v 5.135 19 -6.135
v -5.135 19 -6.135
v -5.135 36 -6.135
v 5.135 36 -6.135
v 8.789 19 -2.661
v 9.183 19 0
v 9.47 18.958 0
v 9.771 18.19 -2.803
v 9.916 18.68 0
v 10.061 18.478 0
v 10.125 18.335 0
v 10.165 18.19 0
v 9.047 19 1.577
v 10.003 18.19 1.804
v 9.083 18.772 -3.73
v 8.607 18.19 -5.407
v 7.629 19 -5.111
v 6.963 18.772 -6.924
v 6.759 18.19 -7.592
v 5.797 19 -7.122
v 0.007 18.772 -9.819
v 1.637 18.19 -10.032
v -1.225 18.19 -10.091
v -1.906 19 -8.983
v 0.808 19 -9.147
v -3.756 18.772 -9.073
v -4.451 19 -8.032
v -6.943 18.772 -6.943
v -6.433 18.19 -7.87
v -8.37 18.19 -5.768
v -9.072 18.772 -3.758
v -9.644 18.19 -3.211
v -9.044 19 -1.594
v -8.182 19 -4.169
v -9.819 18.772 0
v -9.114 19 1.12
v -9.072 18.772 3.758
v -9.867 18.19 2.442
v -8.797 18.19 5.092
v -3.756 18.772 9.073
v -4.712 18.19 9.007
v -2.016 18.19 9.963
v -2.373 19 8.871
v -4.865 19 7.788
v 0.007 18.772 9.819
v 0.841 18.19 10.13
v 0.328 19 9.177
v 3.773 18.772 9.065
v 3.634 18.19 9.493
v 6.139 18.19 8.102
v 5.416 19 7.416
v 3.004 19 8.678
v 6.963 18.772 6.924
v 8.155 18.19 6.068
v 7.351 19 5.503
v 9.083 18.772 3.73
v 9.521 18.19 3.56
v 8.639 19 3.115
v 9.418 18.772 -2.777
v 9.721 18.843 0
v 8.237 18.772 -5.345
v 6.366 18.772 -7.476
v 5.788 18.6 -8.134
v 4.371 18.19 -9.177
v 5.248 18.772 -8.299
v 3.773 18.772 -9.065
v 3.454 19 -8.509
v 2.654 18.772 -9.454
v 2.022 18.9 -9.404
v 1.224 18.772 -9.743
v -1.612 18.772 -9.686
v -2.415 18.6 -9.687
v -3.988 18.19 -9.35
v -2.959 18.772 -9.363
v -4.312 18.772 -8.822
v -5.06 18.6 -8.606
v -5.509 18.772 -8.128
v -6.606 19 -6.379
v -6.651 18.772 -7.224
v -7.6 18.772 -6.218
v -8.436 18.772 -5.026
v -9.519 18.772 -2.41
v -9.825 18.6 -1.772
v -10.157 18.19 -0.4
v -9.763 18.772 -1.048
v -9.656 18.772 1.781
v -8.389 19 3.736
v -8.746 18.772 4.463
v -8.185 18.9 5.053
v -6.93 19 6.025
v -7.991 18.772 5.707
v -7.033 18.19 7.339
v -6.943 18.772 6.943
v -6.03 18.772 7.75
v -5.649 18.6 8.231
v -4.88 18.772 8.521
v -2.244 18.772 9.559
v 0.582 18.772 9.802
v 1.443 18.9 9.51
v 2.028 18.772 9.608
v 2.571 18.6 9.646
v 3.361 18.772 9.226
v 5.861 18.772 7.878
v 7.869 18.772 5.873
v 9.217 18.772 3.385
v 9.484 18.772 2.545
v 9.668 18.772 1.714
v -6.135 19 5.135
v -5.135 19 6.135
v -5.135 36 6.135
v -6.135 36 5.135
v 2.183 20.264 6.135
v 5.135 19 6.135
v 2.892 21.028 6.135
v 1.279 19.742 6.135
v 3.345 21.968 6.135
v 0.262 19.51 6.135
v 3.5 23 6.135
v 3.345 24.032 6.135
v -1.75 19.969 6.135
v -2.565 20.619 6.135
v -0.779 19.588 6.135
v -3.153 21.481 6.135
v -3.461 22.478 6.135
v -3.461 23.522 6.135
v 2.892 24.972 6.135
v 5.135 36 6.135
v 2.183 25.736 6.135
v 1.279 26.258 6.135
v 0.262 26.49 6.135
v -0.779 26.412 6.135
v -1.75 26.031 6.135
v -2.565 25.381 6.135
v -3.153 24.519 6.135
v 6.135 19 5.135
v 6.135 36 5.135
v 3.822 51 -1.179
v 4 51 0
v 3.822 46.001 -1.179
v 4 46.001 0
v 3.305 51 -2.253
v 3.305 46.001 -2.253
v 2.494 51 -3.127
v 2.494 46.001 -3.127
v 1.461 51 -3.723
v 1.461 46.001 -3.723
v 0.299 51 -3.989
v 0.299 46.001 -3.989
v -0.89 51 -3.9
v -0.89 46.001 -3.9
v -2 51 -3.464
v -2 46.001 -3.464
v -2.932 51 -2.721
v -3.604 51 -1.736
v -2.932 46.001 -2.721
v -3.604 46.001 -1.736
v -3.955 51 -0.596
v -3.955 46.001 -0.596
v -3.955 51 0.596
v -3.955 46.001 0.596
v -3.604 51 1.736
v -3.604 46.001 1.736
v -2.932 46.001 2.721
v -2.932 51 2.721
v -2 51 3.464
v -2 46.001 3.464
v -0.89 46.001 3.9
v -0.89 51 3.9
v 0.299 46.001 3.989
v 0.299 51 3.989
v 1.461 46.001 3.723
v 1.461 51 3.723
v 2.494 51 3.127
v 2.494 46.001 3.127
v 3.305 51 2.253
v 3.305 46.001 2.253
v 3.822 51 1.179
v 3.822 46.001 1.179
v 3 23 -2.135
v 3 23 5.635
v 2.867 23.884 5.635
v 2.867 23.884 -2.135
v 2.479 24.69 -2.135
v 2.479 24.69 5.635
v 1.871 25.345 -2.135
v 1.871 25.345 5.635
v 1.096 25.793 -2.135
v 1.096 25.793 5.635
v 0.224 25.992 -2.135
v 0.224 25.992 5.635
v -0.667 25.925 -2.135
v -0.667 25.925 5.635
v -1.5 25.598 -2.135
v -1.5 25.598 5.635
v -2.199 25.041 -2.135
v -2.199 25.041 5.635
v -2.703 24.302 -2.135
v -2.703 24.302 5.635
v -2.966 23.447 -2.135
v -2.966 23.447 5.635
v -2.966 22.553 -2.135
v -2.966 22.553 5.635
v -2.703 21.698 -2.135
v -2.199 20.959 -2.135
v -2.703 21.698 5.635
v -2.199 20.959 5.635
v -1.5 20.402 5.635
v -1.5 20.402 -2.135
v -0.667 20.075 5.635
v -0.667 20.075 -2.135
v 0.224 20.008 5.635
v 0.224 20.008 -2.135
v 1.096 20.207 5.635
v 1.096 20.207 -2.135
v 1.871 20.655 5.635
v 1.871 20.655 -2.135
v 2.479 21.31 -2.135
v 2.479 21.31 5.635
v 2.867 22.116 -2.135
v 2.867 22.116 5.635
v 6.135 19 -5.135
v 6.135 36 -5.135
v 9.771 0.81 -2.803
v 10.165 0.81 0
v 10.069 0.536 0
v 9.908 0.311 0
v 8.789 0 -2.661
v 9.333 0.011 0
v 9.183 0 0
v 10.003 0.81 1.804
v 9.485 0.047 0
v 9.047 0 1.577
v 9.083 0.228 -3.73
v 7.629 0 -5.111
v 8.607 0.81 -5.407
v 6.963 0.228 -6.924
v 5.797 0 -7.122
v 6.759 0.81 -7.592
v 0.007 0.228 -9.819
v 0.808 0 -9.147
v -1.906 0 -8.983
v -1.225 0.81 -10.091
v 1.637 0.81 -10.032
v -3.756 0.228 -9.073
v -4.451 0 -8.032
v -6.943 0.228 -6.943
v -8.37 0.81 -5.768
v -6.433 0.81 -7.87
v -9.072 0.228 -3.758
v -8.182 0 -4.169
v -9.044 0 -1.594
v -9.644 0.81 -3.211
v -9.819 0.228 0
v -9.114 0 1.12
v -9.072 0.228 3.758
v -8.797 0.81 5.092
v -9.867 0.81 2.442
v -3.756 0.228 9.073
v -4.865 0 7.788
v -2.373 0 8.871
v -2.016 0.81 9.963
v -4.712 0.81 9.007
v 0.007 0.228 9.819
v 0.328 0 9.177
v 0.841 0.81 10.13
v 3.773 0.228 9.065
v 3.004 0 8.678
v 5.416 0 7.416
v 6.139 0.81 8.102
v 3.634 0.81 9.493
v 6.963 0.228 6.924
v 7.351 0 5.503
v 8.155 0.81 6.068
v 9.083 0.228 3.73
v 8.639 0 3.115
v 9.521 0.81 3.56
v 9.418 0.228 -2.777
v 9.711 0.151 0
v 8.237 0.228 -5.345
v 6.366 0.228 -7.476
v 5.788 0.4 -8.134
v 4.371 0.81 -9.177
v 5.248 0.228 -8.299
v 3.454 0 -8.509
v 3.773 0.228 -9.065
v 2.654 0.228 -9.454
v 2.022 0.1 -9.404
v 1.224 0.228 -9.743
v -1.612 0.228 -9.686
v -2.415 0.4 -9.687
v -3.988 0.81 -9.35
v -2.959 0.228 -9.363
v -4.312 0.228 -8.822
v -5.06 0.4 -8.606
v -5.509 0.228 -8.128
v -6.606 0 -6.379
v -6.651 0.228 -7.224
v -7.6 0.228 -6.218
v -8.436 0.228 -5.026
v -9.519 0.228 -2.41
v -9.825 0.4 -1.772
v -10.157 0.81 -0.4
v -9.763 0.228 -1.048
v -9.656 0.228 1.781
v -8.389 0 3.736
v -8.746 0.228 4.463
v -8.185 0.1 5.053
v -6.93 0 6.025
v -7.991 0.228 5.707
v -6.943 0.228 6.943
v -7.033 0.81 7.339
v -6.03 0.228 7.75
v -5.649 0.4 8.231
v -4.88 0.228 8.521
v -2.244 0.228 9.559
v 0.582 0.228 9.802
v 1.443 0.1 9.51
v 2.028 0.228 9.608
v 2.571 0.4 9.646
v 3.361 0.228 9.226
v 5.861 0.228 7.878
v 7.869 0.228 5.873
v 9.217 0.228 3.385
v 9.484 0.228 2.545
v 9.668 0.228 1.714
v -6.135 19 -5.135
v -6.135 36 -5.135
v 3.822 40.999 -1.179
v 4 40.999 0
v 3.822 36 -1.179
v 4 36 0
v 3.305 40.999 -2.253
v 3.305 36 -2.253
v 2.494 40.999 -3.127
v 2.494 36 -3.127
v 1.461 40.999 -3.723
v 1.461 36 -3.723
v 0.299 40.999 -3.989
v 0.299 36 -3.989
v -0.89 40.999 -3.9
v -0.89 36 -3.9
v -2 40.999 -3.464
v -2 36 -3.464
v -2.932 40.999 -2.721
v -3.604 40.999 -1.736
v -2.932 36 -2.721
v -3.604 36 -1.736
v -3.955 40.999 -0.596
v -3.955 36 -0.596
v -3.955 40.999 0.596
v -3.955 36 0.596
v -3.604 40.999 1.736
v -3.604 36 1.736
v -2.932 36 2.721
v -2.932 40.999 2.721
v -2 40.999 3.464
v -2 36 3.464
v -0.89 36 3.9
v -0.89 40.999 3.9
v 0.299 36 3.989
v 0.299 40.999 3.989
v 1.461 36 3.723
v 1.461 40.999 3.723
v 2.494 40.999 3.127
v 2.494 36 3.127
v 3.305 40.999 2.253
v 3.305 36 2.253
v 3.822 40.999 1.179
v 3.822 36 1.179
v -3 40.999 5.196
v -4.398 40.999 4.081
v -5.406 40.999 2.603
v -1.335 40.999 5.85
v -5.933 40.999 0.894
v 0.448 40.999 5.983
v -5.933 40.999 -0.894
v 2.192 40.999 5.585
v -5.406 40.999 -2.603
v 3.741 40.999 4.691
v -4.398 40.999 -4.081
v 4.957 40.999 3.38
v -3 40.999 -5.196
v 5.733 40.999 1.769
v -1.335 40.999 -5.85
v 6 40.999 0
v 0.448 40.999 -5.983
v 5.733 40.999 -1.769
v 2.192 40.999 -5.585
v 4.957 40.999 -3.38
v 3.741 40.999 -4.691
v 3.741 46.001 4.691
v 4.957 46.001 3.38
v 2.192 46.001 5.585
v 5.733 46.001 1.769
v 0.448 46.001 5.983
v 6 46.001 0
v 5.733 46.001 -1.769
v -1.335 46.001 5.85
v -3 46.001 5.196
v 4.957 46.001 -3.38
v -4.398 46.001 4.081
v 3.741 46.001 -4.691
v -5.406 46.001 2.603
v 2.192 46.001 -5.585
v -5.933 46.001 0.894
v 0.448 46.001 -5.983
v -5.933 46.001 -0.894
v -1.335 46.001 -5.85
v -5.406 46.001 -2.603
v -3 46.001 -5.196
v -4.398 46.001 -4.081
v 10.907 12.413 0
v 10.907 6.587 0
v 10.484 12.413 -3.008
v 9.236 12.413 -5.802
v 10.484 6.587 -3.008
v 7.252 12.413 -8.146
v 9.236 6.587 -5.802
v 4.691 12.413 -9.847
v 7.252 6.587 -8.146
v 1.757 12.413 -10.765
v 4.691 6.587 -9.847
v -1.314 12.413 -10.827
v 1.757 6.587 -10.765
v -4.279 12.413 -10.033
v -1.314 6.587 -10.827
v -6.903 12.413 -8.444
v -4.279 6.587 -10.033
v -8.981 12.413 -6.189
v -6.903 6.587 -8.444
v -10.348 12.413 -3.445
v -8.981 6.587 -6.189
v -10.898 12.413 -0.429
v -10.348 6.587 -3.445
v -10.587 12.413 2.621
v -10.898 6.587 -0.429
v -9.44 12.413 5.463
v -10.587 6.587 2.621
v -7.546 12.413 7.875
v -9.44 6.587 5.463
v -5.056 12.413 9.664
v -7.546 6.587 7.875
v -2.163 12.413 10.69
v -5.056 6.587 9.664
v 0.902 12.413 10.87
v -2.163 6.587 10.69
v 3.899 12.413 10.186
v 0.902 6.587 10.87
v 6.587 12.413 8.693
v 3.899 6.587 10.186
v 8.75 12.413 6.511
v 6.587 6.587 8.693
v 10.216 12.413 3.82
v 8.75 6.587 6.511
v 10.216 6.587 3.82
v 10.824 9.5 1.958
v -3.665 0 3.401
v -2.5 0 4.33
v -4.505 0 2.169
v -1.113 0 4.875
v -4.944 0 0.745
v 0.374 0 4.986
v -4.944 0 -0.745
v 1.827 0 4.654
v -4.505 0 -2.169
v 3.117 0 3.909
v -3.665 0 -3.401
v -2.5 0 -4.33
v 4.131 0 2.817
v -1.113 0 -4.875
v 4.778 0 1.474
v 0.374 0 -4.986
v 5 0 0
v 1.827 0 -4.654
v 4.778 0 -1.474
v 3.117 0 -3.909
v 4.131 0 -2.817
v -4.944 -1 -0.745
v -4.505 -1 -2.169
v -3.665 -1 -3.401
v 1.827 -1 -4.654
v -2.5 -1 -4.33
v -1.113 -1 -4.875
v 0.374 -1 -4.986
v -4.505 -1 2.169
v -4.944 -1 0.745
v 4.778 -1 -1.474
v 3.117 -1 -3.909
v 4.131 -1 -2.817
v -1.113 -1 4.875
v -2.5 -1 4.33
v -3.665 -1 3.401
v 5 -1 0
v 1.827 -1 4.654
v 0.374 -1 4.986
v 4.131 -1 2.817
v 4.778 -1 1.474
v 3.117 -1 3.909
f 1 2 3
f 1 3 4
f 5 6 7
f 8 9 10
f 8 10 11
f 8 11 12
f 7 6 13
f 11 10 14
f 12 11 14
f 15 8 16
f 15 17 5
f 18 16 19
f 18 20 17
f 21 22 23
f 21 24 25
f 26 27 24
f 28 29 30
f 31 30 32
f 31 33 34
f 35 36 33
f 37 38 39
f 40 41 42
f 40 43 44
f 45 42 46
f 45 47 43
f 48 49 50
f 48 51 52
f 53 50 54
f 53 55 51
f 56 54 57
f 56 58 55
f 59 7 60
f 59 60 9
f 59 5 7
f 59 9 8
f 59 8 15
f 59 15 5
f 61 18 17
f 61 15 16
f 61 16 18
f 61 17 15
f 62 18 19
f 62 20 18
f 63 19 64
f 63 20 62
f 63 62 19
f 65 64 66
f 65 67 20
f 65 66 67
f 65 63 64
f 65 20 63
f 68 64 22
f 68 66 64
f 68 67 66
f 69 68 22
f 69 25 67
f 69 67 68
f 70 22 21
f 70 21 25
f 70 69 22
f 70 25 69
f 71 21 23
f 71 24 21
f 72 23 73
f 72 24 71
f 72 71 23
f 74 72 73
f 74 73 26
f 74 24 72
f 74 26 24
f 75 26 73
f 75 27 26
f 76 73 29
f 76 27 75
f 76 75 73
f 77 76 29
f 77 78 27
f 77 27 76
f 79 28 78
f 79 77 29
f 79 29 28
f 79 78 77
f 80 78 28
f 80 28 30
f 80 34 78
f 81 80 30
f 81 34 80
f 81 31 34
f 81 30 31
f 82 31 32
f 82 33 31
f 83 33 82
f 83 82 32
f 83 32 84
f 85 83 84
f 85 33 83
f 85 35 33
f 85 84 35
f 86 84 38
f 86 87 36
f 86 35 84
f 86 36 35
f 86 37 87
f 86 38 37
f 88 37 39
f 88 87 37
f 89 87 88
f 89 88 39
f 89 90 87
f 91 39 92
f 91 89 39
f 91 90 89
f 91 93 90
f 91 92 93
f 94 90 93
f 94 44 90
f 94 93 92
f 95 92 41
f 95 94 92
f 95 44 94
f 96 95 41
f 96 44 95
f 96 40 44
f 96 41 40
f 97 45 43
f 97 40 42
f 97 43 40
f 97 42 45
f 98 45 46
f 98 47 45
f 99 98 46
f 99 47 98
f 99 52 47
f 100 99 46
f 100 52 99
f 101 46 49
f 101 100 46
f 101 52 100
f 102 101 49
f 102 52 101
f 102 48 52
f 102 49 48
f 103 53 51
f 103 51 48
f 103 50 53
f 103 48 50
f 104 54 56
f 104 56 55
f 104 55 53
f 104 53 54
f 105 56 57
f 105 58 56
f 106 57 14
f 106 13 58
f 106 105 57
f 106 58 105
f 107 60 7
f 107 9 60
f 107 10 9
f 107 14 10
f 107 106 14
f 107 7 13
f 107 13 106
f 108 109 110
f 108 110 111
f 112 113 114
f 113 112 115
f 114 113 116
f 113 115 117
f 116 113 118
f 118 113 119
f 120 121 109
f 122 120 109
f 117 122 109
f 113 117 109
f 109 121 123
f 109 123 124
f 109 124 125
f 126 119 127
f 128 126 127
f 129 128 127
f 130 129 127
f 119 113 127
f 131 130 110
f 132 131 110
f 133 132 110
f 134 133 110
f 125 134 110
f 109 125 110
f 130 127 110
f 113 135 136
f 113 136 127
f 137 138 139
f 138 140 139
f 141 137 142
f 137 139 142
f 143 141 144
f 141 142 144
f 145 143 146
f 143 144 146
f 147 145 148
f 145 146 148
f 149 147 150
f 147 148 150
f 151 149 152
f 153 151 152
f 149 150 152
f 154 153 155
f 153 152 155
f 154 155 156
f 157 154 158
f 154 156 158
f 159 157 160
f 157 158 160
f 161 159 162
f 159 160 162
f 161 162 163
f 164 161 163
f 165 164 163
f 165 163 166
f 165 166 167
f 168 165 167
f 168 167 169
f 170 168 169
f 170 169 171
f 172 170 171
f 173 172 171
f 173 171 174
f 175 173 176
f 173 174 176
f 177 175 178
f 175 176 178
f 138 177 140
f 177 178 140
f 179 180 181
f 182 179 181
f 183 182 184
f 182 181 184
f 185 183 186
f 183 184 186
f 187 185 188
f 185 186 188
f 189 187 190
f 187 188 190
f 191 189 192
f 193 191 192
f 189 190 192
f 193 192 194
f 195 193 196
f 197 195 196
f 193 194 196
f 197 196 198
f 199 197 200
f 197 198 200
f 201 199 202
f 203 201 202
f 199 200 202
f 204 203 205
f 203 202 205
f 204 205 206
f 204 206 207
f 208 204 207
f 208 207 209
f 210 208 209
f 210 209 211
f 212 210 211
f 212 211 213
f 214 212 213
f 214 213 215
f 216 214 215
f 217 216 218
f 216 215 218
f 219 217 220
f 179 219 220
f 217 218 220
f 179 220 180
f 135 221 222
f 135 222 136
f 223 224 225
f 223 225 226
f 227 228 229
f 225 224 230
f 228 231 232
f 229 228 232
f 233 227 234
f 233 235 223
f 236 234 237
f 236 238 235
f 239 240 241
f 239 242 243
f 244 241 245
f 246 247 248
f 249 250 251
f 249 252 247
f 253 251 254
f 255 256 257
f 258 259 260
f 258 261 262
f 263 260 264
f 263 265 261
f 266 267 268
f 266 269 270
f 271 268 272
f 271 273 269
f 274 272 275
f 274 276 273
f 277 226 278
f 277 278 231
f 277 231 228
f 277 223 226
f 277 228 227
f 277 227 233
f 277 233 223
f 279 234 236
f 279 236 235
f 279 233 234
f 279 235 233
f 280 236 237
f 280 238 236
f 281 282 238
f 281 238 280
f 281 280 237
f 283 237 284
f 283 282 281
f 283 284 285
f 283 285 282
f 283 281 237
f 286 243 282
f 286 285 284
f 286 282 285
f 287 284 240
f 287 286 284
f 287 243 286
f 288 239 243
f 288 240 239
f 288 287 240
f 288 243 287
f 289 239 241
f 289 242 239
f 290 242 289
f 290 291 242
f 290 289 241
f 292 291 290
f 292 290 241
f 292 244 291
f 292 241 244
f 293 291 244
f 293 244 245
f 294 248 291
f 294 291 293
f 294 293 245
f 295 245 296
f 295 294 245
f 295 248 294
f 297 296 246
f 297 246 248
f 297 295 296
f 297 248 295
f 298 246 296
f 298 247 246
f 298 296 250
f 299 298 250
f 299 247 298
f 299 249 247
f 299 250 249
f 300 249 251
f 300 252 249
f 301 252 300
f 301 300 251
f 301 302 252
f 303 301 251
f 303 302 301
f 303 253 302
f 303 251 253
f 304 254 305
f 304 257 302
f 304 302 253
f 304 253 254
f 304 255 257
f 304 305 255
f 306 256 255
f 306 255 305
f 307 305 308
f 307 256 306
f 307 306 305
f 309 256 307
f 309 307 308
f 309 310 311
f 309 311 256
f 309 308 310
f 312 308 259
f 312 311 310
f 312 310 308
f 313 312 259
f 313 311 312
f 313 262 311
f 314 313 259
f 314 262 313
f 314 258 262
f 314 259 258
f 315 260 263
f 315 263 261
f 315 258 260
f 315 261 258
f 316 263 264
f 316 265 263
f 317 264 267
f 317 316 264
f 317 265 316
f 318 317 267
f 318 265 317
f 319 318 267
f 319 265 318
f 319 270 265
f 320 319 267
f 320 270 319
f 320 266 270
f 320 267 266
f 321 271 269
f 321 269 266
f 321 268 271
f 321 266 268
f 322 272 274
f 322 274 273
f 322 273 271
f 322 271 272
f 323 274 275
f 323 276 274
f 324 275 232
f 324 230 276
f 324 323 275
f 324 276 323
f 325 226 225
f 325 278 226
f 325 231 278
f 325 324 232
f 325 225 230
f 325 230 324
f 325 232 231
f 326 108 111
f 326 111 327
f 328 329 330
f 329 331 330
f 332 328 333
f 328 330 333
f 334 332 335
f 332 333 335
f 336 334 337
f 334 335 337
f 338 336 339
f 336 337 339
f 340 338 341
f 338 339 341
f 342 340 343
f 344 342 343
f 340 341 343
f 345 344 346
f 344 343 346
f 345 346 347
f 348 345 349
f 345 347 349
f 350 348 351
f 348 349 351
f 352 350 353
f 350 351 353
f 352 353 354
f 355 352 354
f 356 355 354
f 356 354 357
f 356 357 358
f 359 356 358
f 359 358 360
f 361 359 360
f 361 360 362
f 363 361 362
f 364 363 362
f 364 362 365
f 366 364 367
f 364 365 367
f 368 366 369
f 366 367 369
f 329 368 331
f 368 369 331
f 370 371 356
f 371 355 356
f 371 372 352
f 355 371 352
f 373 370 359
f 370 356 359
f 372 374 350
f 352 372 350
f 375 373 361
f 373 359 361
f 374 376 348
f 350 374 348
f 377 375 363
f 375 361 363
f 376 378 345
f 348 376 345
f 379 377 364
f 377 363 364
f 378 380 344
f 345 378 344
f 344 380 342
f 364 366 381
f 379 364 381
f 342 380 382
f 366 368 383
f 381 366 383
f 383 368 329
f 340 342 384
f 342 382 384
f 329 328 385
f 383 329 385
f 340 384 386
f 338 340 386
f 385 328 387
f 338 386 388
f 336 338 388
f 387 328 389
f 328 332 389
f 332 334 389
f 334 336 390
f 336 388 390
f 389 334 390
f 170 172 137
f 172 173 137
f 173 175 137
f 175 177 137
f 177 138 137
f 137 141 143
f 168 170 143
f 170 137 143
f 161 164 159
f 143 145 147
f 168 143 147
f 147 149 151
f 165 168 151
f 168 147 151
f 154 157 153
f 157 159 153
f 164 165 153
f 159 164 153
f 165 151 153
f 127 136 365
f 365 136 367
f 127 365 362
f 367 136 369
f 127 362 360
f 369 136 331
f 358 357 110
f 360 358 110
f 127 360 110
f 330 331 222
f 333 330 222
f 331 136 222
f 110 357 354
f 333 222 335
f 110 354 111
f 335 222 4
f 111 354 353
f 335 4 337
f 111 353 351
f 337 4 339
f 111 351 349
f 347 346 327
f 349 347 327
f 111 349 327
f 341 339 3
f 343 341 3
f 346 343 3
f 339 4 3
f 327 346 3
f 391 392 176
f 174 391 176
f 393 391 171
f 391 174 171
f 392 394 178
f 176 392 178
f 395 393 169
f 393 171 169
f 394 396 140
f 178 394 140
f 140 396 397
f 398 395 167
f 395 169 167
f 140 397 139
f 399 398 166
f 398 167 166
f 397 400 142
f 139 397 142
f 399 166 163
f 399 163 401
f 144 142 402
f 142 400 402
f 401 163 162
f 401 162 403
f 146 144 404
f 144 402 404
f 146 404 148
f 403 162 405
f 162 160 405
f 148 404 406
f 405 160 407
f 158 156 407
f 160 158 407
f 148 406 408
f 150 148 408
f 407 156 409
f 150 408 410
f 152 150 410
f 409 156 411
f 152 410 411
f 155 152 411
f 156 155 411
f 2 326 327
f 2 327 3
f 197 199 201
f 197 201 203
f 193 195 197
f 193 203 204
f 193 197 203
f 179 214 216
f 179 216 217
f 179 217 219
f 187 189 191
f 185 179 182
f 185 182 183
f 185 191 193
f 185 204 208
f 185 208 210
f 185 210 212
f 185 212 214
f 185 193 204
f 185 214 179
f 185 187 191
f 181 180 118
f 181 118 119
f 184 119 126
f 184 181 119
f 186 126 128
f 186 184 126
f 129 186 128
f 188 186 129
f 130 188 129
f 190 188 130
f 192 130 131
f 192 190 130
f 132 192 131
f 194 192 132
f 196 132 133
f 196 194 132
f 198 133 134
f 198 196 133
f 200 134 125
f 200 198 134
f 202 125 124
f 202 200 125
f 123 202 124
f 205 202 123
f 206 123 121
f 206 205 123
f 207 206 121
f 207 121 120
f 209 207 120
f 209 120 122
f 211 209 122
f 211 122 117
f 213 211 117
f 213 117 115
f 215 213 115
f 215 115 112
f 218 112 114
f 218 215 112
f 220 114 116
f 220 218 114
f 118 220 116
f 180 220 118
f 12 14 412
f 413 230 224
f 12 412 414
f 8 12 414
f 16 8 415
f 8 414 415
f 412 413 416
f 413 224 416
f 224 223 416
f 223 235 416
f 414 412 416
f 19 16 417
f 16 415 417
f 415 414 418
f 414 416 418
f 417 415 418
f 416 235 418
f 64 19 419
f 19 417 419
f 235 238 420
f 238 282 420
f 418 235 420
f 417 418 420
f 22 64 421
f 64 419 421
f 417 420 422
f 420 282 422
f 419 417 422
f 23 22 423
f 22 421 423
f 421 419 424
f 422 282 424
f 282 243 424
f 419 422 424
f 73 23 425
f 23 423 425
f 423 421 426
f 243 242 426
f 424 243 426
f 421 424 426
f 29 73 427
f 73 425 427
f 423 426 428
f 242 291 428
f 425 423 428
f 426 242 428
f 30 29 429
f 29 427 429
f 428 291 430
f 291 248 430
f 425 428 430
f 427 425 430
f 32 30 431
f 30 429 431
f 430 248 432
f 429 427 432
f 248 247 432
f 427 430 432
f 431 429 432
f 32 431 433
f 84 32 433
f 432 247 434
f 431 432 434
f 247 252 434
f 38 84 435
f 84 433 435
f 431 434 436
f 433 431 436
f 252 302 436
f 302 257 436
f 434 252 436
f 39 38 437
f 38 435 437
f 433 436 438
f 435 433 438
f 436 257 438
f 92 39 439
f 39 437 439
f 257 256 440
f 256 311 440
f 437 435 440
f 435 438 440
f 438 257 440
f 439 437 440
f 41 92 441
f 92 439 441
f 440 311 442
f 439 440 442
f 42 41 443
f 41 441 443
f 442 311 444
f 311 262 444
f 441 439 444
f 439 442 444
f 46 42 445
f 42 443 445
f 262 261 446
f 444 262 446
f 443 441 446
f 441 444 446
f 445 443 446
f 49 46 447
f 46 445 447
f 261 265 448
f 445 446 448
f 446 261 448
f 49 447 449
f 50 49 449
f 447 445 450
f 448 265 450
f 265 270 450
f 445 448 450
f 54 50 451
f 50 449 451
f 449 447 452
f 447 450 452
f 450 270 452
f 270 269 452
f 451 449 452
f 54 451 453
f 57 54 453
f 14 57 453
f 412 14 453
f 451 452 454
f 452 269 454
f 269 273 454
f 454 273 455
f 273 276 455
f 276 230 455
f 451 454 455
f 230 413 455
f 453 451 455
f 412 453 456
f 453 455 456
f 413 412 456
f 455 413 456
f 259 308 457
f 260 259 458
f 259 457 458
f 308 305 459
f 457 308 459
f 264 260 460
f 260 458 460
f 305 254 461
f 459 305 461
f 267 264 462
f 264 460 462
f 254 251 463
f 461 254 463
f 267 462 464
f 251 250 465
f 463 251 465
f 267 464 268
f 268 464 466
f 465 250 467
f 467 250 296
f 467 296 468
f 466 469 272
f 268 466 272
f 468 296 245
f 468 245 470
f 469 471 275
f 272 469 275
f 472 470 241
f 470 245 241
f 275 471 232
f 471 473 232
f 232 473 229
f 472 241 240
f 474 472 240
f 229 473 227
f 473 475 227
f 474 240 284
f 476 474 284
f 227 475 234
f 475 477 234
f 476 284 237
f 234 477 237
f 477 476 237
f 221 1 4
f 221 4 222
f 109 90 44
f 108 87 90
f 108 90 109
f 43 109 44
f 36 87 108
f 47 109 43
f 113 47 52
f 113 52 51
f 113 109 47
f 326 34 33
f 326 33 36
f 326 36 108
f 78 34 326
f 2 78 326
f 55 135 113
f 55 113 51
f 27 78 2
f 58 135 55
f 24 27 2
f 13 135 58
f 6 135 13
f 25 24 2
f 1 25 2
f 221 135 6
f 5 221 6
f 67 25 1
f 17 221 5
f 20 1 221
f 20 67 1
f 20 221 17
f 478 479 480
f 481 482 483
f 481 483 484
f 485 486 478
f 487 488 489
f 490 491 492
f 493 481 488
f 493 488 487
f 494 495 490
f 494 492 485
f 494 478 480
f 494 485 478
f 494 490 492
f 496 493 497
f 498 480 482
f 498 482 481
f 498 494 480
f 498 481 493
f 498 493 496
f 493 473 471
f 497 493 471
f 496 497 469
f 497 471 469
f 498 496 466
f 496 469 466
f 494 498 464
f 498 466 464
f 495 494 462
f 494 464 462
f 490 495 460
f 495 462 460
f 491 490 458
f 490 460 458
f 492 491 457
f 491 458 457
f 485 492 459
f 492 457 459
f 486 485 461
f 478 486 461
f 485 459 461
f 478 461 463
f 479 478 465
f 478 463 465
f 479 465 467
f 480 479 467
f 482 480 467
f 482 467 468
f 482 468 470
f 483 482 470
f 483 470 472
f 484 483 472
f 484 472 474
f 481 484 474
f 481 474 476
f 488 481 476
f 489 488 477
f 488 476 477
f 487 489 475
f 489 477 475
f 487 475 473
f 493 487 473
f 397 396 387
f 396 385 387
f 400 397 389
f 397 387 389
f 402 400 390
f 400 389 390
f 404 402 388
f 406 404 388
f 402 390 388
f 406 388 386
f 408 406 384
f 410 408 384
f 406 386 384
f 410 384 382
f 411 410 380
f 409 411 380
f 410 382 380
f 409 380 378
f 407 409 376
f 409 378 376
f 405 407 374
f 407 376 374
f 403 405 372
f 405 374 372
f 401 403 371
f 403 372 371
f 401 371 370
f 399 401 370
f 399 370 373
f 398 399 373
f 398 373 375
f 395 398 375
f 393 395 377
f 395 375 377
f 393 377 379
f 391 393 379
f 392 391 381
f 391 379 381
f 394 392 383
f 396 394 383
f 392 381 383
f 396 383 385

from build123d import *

# Parameters (mm, degrees)
SKETCH2_OUTSIDE_W   = 35.948
SKETCH2_OUTSIDE_H   = 35.948
CUT_EXTRUDE1_DEPTH  = 17
SKETCH3_R           = 3
CUT_EXTRUDE2_DEPTH  = 8.269428
CHAMFER1_SIZE       = 0.5
SKETCH4_R           = 5
BOSS_EXTRUDE1_DEPTH = 1
FILLET1_R           = 1


with BuildPart() as part:
    # Sketch1 → Revolve1 (revolve)
    with BuildSketch(Plane.XY):
        with BuildLine():
            Line((0, 0), (0, 51))
            Line((0, 51), (4, 51))
            Line((4, 51), (4, 46.000706479))
            Line((4, 46.000706479), (6, 46.000706479))
            Line((6, 46.000706479), (6, 40.999293521))
            Line((6, 40.999293521), (4, 40.999293521))
            Line((4, 40.999293521), (4, 36))
            Line((4, 36), (8, 36))
            Line((8, 36), (8, 19))
            Line((8, 19), (10, 19))
            ThreePointArc((10, 19), (11, 9.5), (10, 0))
            Line((10, 0), (0, 0))
        make_face()
    revolve(axis=Axis((0, 0, 0), (0, 1, 0)))

    # Sketch2 outside → Cut-Extrude1 (cut)
    with BuildSketch(Plane(origin=(0, 36, 0), x_dir=(1, 0, 0), z_dir=(0, 1, 0))):
        Rectangle(SKETCH2_OUTSIDE_W, SKETCH2_OUTSIDE_H)
        Polygon((-6.134713835, 5.134713835), (-5.134713835, 6.134713835), (5.134713835, 6.134713835), (6.134713835, 5.134713835), (6.134713835, -5.134713835), (5.134713835, -6.134713835), (-5.134713835, -6.134713835), (-6.134713835, -5.134713835), align=None, mode=Mode.SUBTRACT)
    extrude(amount=-CUT_EXTRUDE1_DEPTH, mode=Mode.SUBTRACT)

    # Sketch3 → Cut-Extrude2 (cut)
    with BuildSketch(Plane.XY.offset(6.134713835)):
        with Locations((0.000286165, 23)):
            Circle(SKETCH3_R)
    extrude(amount=-CUT_EXTRUDE2_DEPTH, mode=Mode.SUBTRACT)

    # Chamfer1
    chamfer1_edges = [part.edges().sort_by_distance(p)[0] for p in [
        (-2.999713835, 23, 6.134713835),
    ]]
    chamfer(chamfer1_edges, length=CHAMFER1_SIZE)

    # Sketch4 → Boss-Extrude1 (add)
    with BuildSketch(Plane.XZ):
        Circle(SKETCH4_R)
    extrude(amount=BOSS_EXTRUDE1_DEPTH)

    # Fillet1
    fillet1_edges = [part.edges().sort_by_distance(p)[0] for p in [
        (-10, 0, 0),
        (-10, 19, 0),
    ]]
    fillet(fillet1_edges, radius=FILLET1_R)


solid = part.part
